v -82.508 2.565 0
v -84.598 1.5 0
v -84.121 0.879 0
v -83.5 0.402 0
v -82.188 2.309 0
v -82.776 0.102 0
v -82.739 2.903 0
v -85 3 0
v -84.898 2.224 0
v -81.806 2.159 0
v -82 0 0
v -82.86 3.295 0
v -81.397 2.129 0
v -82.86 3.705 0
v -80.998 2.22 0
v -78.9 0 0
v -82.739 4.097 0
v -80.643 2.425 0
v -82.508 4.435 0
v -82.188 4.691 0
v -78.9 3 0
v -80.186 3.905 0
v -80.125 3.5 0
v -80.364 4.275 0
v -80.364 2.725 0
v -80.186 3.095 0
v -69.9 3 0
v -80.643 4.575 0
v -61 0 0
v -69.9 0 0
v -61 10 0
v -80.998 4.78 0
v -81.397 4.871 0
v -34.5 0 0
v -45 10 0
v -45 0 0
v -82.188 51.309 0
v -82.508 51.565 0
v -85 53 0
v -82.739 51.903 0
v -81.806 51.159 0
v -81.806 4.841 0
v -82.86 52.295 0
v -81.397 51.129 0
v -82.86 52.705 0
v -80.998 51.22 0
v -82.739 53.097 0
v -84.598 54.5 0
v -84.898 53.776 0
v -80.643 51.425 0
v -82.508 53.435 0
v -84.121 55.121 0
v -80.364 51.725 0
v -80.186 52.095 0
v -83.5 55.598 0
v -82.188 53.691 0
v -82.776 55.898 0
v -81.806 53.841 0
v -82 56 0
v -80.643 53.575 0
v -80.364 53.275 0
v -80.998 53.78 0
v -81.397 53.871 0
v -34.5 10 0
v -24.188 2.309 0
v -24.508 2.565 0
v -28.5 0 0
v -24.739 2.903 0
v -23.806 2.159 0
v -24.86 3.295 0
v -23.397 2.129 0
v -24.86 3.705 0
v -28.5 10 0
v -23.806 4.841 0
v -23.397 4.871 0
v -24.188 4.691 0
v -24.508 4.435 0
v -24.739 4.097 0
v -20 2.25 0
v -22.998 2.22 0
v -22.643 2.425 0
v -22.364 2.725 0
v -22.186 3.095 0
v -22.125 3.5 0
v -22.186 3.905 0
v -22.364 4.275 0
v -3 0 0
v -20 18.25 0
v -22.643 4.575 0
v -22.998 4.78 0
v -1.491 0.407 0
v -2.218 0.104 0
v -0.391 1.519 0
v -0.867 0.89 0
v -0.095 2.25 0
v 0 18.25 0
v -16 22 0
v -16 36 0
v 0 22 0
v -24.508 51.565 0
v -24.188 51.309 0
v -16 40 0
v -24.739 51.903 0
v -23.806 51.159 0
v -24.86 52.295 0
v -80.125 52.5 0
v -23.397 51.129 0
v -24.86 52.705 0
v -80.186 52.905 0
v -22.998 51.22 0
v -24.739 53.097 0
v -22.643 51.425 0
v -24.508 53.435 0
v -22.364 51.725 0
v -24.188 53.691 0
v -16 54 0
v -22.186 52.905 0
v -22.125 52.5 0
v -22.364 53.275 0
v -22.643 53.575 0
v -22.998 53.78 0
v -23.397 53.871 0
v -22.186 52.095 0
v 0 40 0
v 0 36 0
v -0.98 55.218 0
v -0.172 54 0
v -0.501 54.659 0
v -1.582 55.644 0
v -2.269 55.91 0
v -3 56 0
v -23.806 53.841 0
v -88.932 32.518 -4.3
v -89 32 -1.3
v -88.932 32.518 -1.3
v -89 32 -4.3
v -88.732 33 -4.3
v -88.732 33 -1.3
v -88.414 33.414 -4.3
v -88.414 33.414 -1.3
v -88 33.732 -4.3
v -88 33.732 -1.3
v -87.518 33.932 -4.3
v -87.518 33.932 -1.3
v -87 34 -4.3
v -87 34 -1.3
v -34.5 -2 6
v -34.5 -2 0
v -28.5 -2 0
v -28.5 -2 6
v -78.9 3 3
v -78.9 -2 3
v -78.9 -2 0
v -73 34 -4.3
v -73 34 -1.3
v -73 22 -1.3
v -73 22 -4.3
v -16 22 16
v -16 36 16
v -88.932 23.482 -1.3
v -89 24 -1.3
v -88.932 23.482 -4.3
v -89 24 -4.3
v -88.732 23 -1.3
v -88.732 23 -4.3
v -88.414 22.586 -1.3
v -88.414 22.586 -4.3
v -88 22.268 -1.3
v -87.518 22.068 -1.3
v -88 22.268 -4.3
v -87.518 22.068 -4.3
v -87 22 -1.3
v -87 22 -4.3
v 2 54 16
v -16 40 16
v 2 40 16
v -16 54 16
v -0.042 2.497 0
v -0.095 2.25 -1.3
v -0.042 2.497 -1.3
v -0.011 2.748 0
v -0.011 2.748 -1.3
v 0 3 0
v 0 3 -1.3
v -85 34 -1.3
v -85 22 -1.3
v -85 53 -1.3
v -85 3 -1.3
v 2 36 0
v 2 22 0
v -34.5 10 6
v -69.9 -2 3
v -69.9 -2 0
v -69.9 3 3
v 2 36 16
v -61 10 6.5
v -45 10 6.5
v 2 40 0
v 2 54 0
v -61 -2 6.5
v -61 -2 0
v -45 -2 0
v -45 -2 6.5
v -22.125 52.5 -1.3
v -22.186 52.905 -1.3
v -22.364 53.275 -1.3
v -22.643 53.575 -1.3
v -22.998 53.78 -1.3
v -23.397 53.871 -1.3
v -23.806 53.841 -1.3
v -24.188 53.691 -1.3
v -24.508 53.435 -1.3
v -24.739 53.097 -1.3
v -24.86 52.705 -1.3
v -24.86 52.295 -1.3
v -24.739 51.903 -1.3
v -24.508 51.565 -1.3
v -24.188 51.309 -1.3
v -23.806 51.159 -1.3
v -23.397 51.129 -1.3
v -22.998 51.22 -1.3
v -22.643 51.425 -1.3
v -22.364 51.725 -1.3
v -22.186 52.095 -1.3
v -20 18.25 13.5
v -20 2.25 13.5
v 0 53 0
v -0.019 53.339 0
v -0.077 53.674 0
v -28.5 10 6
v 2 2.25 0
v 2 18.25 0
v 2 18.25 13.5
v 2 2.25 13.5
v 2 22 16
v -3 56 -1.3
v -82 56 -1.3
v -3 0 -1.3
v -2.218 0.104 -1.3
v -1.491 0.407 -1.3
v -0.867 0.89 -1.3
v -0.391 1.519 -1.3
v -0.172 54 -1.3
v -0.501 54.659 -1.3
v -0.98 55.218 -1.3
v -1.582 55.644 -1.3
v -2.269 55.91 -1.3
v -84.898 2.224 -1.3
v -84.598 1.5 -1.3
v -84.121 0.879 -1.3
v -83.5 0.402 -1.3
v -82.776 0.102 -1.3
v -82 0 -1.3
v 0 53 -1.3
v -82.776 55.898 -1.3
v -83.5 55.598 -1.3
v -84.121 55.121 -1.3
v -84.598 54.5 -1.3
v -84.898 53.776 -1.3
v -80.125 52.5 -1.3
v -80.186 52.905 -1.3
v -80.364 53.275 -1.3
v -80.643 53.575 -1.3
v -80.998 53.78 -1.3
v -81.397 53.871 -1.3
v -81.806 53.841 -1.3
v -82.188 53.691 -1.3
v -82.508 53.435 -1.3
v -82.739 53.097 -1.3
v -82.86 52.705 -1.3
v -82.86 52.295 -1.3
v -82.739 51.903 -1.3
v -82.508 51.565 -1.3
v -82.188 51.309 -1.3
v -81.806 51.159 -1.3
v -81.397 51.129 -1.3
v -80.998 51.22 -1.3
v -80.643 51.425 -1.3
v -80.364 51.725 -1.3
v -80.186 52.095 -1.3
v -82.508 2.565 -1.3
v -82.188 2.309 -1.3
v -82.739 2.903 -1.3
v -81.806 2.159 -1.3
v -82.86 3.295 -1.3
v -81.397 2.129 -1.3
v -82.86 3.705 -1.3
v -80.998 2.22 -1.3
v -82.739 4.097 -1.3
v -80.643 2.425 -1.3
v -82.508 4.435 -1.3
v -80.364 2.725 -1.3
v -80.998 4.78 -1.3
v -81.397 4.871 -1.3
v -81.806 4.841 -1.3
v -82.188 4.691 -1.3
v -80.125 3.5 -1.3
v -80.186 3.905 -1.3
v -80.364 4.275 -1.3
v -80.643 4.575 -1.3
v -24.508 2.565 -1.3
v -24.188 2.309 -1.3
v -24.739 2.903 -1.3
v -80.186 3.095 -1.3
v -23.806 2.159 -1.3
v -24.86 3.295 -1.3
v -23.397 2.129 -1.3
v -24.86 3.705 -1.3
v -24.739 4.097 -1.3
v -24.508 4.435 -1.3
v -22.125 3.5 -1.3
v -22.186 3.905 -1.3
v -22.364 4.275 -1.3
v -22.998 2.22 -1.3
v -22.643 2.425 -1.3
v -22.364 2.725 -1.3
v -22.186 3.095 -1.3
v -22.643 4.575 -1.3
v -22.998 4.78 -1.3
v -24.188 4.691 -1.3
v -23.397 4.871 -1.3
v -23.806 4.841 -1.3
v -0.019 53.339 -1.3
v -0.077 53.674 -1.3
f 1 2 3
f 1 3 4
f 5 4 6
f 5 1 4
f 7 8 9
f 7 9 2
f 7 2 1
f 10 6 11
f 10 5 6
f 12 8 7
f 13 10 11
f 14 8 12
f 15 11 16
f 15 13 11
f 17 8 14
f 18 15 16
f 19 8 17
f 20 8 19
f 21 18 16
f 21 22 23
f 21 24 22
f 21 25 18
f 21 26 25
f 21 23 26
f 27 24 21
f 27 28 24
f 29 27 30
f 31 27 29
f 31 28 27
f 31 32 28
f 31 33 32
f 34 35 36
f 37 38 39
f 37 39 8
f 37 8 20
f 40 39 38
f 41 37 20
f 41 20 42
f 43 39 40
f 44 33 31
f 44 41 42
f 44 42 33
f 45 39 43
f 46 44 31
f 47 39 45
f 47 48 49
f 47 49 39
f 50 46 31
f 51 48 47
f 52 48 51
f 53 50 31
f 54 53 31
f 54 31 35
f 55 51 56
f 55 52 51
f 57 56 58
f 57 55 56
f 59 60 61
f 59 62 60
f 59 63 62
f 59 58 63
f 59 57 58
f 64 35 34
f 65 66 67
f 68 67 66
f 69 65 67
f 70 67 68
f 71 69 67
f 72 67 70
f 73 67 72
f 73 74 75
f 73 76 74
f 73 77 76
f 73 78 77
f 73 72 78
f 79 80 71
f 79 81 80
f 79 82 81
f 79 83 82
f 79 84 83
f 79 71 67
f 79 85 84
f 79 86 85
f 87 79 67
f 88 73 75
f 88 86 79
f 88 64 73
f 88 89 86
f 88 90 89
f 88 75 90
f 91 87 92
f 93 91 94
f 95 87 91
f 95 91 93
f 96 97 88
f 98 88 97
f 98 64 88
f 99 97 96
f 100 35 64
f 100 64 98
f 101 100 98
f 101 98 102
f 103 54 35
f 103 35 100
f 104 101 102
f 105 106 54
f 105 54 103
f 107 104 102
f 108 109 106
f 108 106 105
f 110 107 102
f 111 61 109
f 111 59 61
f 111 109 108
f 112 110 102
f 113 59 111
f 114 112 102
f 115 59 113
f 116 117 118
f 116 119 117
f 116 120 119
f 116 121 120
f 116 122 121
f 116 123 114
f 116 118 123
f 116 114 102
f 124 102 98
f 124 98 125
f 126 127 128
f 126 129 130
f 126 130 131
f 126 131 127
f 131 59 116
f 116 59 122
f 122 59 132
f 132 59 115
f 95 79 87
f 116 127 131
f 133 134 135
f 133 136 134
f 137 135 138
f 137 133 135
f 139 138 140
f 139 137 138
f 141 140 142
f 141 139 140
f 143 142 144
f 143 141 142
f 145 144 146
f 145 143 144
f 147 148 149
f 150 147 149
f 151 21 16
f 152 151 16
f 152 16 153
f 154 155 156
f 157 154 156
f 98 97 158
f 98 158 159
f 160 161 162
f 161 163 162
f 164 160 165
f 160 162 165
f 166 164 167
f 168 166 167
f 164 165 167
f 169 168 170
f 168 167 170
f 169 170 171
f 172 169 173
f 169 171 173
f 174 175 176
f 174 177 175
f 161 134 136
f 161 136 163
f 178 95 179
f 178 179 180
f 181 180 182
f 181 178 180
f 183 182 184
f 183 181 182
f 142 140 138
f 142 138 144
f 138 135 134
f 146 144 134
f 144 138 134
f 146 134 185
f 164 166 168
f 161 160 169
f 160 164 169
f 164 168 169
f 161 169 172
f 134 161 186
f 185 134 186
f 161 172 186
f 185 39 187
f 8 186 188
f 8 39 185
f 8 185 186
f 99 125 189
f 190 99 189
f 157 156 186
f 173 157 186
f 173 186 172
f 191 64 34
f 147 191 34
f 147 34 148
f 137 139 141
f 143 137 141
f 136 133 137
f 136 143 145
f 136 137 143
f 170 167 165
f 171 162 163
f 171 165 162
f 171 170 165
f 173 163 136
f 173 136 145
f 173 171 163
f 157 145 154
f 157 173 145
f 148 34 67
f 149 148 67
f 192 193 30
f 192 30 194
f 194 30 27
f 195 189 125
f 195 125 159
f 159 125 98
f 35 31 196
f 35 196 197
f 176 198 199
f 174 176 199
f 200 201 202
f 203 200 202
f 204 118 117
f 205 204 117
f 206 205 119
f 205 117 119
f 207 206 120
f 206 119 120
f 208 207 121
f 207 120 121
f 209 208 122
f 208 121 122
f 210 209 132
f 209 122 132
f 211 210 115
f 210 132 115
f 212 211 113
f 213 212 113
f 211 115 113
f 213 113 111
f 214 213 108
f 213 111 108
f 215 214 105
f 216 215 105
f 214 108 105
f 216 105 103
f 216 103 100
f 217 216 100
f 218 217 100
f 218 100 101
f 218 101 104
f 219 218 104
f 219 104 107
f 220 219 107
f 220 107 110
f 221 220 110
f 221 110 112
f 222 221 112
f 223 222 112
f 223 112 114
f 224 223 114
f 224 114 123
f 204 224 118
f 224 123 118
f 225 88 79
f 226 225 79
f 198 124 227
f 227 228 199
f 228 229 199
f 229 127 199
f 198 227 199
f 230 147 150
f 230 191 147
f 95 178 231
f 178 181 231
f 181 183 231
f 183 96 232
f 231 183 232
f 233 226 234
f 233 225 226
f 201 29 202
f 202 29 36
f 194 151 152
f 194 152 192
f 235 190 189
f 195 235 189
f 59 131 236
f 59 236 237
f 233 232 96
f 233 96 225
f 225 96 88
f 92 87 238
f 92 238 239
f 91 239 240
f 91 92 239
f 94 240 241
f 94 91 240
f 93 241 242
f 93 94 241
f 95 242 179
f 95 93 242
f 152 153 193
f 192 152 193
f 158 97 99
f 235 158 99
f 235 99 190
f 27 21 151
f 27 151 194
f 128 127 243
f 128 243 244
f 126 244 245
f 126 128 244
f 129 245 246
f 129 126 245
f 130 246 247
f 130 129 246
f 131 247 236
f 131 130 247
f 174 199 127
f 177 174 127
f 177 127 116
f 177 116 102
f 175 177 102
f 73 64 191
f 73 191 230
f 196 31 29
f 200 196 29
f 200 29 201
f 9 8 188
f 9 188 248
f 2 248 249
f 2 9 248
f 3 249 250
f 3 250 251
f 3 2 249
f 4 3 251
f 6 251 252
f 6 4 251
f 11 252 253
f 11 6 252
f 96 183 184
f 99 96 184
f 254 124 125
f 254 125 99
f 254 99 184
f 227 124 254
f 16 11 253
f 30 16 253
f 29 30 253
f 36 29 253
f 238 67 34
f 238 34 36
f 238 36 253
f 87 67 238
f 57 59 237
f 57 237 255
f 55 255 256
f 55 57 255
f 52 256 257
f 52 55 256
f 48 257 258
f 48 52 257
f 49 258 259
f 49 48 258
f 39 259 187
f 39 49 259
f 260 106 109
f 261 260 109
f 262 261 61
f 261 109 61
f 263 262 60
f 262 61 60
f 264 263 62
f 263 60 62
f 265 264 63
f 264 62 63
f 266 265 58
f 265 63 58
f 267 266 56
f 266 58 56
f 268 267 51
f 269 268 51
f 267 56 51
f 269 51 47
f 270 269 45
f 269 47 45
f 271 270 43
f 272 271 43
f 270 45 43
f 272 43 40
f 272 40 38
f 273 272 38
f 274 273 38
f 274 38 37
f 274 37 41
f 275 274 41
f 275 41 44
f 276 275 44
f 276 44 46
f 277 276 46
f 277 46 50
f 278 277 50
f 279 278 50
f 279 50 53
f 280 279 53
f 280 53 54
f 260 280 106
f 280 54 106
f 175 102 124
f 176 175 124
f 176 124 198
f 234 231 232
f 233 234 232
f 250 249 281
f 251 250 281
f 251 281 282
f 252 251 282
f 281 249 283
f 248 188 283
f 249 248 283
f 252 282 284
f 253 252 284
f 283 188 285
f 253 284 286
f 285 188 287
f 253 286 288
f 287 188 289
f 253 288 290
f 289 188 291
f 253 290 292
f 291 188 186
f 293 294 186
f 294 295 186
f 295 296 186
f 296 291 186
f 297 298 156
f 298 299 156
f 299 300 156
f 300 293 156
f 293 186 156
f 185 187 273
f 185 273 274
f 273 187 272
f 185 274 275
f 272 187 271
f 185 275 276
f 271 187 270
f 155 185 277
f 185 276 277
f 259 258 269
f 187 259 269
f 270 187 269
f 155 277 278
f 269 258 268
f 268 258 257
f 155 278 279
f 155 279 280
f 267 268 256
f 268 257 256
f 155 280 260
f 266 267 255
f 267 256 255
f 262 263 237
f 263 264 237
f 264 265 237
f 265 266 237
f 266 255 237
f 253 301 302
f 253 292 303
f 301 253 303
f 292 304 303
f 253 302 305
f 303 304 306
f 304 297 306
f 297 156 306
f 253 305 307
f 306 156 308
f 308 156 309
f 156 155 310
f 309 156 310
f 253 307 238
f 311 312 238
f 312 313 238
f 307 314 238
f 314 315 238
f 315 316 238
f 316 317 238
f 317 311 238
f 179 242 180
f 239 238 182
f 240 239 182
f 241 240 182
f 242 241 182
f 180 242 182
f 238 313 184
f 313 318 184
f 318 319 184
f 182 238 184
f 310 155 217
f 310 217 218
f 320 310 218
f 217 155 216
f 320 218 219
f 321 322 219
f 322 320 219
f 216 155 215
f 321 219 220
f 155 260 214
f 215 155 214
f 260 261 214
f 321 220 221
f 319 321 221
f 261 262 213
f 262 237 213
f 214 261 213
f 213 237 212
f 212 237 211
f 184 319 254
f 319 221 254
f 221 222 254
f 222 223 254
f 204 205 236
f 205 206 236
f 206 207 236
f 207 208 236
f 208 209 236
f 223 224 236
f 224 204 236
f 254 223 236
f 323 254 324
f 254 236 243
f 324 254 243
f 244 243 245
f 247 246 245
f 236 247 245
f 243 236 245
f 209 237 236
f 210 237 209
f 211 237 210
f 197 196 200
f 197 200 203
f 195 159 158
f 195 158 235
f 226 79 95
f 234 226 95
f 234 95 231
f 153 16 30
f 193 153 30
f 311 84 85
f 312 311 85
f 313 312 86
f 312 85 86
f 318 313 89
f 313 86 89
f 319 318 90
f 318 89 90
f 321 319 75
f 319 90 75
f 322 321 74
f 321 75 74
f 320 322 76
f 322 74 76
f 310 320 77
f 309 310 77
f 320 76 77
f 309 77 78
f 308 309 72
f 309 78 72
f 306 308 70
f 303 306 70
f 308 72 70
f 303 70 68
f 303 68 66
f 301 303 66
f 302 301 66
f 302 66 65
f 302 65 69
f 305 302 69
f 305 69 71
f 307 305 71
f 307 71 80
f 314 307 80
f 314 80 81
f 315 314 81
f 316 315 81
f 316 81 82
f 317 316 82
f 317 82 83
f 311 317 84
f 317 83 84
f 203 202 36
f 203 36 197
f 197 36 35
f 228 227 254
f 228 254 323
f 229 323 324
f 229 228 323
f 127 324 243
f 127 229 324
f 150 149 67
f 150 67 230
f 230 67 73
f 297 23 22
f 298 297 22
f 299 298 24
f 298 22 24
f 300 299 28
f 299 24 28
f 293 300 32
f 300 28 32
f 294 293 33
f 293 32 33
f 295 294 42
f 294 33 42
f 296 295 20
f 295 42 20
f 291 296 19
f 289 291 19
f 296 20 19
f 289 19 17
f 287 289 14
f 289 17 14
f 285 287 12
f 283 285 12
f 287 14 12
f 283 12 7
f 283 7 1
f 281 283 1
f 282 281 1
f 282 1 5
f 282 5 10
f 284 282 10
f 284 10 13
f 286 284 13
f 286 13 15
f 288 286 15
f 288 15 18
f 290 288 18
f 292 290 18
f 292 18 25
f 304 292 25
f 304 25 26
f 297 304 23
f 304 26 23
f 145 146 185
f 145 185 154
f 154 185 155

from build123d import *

# Parameters (mm, degrees)
F0_R     = 1.375
F0_W     = 9
F0_H     = 3
F0_W_2   = 16
F0_H_2   = 10
F0_W_3   = 6
F0_H_3   = 14
F1_DEPTH = 1.3
F0_W_4   = 2
F2_DEPTH = 16
F3_DEPTH = 13.5
F0_H_4   = 2
F4_DEPTH = 6
F5_DEPTH = 6.5
F6_DEPTH = 3
F7_W     = 4
F7_H     = 12
F7_W_2   = 12
F8_DEPTH = 3
F9_R     = 2


# Not quite as in the source:
# - a feature names something its author has since deleted; it is built from what else it names


with BuildPart() as f1:
    # F0 (on Top) → F1 (new body)
    with BuildSketch(Plane.XY):
        with BuildLine():
            Line((-28.5, 0), (-3, 0))
            ThreePointArc((-3, 0), (-1.1628826929, 0.6282917549), (-0.0952624903, 2.25))
            Line((-0.0952624903, 2.25), (-20, 2.25))
            Line((-20, 2.25), (-20, 18.25))
            Line((-20, 18.25), (0, 18.25))
            Line((0, 18.25), (0, 22))
            Line((0, 22), (-16, 22))
            Line((-16, 22), (-16, 36))
            Line((-16, 36), (0, 36))
            Line((0, 36), (0, 40))
            Line((0, 40), (-16, 40))
            Line((-16, 40), (-16, 54))
            Line((-16, 54), (-0.1715728753, 54))
            ThreePointArc((-0.1715728753, 54), (-1.2679491924, 55.4494897428), (-3, 56))
            Line((-3, 56), (-82, 56))
            ThreePointArc((-82, 56), (-84.1213203436, 55.1213203436), (-85, 53))
            Line((-85, 53), (-85, 3))
            ThreePointArc((-85, 3), (-84.1213203436, 0.8786796564), (-82, 0))
            Line((-82, 0), (-78.9, 0))
            Line((-78.9, 0), (-78.9, 3))
            Line((-78.9, 3), (-69.9, 3))
            Line((-69.9, 3), (-69.9, 0))
            Line((-69.9, 0), (-61, 0))
            Line((-61, 0), (-61, 10))
            Line((-61, 10), (-45, 10))
            Line((-45, 10), (-45, 0))
            Line((-45, 0), (-34.5, 0))
            Line((-34.5, 0), (-34.5, 10))
            Line((-34.5, 10), (-28.5, 10))
            Line((-28.5, 10), (-28.5, 0))
        make_face()
        with Locations((-81.5, 3.5)):
            Circle(F0_R, mode=Mode.SUBTRACT)
        with Locations((-23.5, 3.5)):
            Circle(F0_R, mode=Mode.SUBTRACT)
        with Locations((-81.5, 52.5)):
            Circle(F0_R, mode=Mode.SUBTRACT)
        with Locations((-23.5, 52.5)):
            Circle(F0_R, mode=Mode.SUBTRACT)
        with Locations((-74.4, 1.5)):
            Rectangle(F0_W, F0_H)
        with Locations((-53, 5)):
            Rectangle(F0_W_2, F0_H_2)
        with Locations((-31.5, 5)):
            Rectangle(F0_W_3, F0_H_2)
        with BuildLine():
            Line((-20, 2.25), (-0.0952624903, 2.25))
            ThreePointArc((-0.0952624903, 2.25), (-0.0239109112, 2.6219871226), (0, 3))
            Line((0, 3), (0, 18.25))
            Line((0, 18.25), (-20, 18.25))
            Line((-20, 18.25), (-20, 2.25))
        make_face()
        with Locations((-8, 29)):
            Rectangle(F0_W_2, F0_H_3)
        with BuildLine():
            Line((-16, 40), (0, 40))
            Line((0, 40), (0, 53))
            ThreePointArc((0, 53), (-0.043204321, 53.5073059362), (-0.1715728753, 54))
            Line((-0.1715728753, 54), (-16, 54))
            Line((-16, 54), (-16, 40))
        make_face()
    extrude(amount=-F1_DEPTH)

    # F0 (on Top) → F2 (join)
    with BuildSketch(Plane.XY):
        with BuildLine():
            Line((-16, 40), (0, 40))
            Line((0, 40), (0, 53))
            ThreePointArc((0, 53), (-0.043204321, 53.5073059362), (-0.1715728753, 54))
            Line((-0.1715728753, 54), (-16, 54))
            Line((-16, 54), (-16, 40))
        make_face()
        with Locations((-8, 29)):
            Rectangle(F0_W_2, F0_H_3)
        with Locations((1, 29)):
            Rectangle(F0_W_4, F0_H_3)
        with BuildLine():
            Line((0, 53), (0, 40))
            Line((0, 40), (2, 40))
            Line((2, 40), (2, 54))
            Line((2, 54), (-0.1715728753, 54))
            ThreePointArc((-0.1715728753, 54), (-0.043204321, 53.5073059362), (0, 53))
        make_face()
    extrude(amount=F2_DEPTH)

    # F0 (on Top) → F3 (join)
    with BuildSketch(Plane.XY):
        with BuildLine():
            Line((-20, 2.25), (-0.0952624903, 2.25))
            ThreePointArc((-0.0952624903, 2.25), (-0.0239109112, 2.6219871226), (0, 3))
            Line((0, 3), (0, 18.25))
            Line((0, 18.25), (-20, 18.25))
            Line((-20, 18.25), (-20, 2.25))
        make_face()
        with BuildLine():
            ThreePointArc((0, 3), (-0.0239109112, 2.6219871226), (-0.0952624903, 2.25))
            Line((-0.0952624903, 2.25), (2, 2.25))
            Line((2, 2.25), (2, 18.25))
            Line((2, 18.25), (0, 18.25))
            Line((0, 18.25), (0, 3))
        make_face()
    extrude(amount=F3_DEPTH)

    # F0 (on Top) → F4 (join)
    with BuildSketch(Plane.XY):
        with Locations((-31.5, -1)):
            Rectangle(F0_W_3, F0_H_4)
        with Locations((-31.5, 5)):
            Rectangle(F0_W_3, F0_H_2)
    extrude(amount=F4_DEPTH)

    # F0 (on Top) → F5 (join)
    with BuildSketch(Plane.XY):
        with Locations((-53, 5)):
            Rectangle(F0_W_2, F0_H_2)
        with Locations((-53, -1)):
            Rectangle(F0_W_2, F0_H_4)
    extrude(amount=F5_DEPTH)

    # F0 (on Top) → F6 (join)
    with BuildSketch(Plane.XY):
        with Locations((-74.4, 1.5)):
            Rectangle(F0_W, F0_H)
        with Locations((-74.4, -1)):
            Rectangle(F0_W, F0_H_4)
    extrude(amount=F6_DEPTH)

    # F7 (on face) → F8 (join)
    with BuildSketch(Plane(origin=(0, 0, -1.3), x_dir=(1, 0, 0), z_dir=(0, 0, -1))):
        with Locations((-87, -28)):
            Rectangle(F7_W, F7_H)
        with Locations((-79, -28)):
            Rectangle(F7_W_2, F7_H)
    extrude(amount=F8_DEPTH)

    # F9
    f9_edges = [f1.edges().sort_by_distance(p)[0] for p in [
        (-89, 22, -2.8),
        (-89, 34, -2.8),
    ]]
    fillet(f9_edges, radius=F9_R)


solid = f1.part
